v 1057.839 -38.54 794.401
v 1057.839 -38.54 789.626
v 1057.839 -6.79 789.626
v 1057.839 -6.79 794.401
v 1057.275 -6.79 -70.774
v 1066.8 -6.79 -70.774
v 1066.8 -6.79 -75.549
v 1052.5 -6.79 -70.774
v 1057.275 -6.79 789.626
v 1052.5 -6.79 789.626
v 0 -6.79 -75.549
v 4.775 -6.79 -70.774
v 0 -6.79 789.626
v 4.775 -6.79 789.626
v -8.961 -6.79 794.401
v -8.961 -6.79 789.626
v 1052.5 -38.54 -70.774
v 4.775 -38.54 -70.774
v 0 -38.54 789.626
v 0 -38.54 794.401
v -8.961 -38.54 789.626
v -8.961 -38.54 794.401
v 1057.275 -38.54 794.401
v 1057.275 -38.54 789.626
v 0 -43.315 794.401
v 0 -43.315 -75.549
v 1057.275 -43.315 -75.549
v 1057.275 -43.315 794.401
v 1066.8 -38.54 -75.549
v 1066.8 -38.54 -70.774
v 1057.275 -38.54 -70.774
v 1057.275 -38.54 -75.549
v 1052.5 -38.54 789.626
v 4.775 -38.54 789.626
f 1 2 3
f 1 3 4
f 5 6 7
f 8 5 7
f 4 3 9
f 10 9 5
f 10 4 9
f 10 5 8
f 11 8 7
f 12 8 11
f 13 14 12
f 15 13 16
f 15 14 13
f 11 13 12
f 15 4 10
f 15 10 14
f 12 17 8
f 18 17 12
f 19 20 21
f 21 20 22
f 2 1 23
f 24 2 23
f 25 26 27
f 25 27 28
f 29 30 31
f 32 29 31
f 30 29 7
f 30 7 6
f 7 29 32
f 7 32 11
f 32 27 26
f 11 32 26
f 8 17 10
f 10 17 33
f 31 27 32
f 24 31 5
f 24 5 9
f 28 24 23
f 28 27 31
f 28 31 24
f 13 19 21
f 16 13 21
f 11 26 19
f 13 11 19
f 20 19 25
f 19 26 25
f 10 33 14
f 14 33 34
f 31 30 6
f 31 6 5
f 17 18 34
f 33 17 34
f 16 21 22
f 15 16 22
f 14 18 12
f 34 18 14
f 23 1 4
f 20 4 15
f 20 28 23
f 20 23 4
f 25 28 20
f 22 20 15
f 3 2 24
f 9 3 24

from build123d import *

# Parameters (mm, degrees)
F0_W     = 4.7752
F0_H     = 869.95
F1_DEPTH = 1057.275
F2_W     = 4.7752
F2_H     = 869.95
F3_DEPTH = 31.75
F4_W     = 4.7752
F4_H     = 869.95
F5_DEPTH = 31.75
F6_W     = 1066.8
F6_H     = 4.7752
F7_DEPTH = 31.75
F8_W     = 1066.8
F8_H     = 4.7752
F9_DEPTH = 31.75


with BuildPart() as f1:
    # F0 (on Right) → F1 (new body)
    with BuildSketch(Plane.YZ):
        with Locations((-40.927166, 359.425986)):
            Rectangle(F0_W, F0_H)
    extrude(amount=F1_DEPTH)

    # F2 (on face) → F3 (join)
    with BuildSketch(Plane(origin=(0, -38.539566, 0), x_dir=(-1, 0, 0), z_dir=(0, 1, 0))):
        with Locations((-1054.8874, 359.425986)):
            Rectangle(F2_W, F2_H)
    extrude(amount=F3_DEPTH)

    # F4 (on face) → F5 (join)
    with BuildSketch(Plane(origin=(0, -38.539566, 0), x_dir=(-1, 0, 0), z_dir=(0, 1, 0))):
        with Locations((-2.3876, 359.425986)):
            Rectangle(F4_W, F4_H)
    extrude(amount=F5_DEPTH)

    # F6 (on face) → F7 (join)
    with BuildSketch(Plane(origin=(0, -38.539566, 0), x_dir=(-1, 0, 0), z_dir=(0, 1, 0))):
        with Locations((-533.4, -73.161414)):
            Rectangle(F6_W, F6_H)
    extrude(amount=F7_DEPTH)

    # F8 (on face) → F9 (join)
    with BuildSketch(Plane(origin=(0, -38.539566, 0), x_dir=(-1, 0, 0), z_dir=(0, 1, 0))):
        with Locations((-524.438678, 792.013386)):
            Rectangle(F8_W, F8_H)
    extrude(amount=F9_DEPTH)


solid = f1.part
